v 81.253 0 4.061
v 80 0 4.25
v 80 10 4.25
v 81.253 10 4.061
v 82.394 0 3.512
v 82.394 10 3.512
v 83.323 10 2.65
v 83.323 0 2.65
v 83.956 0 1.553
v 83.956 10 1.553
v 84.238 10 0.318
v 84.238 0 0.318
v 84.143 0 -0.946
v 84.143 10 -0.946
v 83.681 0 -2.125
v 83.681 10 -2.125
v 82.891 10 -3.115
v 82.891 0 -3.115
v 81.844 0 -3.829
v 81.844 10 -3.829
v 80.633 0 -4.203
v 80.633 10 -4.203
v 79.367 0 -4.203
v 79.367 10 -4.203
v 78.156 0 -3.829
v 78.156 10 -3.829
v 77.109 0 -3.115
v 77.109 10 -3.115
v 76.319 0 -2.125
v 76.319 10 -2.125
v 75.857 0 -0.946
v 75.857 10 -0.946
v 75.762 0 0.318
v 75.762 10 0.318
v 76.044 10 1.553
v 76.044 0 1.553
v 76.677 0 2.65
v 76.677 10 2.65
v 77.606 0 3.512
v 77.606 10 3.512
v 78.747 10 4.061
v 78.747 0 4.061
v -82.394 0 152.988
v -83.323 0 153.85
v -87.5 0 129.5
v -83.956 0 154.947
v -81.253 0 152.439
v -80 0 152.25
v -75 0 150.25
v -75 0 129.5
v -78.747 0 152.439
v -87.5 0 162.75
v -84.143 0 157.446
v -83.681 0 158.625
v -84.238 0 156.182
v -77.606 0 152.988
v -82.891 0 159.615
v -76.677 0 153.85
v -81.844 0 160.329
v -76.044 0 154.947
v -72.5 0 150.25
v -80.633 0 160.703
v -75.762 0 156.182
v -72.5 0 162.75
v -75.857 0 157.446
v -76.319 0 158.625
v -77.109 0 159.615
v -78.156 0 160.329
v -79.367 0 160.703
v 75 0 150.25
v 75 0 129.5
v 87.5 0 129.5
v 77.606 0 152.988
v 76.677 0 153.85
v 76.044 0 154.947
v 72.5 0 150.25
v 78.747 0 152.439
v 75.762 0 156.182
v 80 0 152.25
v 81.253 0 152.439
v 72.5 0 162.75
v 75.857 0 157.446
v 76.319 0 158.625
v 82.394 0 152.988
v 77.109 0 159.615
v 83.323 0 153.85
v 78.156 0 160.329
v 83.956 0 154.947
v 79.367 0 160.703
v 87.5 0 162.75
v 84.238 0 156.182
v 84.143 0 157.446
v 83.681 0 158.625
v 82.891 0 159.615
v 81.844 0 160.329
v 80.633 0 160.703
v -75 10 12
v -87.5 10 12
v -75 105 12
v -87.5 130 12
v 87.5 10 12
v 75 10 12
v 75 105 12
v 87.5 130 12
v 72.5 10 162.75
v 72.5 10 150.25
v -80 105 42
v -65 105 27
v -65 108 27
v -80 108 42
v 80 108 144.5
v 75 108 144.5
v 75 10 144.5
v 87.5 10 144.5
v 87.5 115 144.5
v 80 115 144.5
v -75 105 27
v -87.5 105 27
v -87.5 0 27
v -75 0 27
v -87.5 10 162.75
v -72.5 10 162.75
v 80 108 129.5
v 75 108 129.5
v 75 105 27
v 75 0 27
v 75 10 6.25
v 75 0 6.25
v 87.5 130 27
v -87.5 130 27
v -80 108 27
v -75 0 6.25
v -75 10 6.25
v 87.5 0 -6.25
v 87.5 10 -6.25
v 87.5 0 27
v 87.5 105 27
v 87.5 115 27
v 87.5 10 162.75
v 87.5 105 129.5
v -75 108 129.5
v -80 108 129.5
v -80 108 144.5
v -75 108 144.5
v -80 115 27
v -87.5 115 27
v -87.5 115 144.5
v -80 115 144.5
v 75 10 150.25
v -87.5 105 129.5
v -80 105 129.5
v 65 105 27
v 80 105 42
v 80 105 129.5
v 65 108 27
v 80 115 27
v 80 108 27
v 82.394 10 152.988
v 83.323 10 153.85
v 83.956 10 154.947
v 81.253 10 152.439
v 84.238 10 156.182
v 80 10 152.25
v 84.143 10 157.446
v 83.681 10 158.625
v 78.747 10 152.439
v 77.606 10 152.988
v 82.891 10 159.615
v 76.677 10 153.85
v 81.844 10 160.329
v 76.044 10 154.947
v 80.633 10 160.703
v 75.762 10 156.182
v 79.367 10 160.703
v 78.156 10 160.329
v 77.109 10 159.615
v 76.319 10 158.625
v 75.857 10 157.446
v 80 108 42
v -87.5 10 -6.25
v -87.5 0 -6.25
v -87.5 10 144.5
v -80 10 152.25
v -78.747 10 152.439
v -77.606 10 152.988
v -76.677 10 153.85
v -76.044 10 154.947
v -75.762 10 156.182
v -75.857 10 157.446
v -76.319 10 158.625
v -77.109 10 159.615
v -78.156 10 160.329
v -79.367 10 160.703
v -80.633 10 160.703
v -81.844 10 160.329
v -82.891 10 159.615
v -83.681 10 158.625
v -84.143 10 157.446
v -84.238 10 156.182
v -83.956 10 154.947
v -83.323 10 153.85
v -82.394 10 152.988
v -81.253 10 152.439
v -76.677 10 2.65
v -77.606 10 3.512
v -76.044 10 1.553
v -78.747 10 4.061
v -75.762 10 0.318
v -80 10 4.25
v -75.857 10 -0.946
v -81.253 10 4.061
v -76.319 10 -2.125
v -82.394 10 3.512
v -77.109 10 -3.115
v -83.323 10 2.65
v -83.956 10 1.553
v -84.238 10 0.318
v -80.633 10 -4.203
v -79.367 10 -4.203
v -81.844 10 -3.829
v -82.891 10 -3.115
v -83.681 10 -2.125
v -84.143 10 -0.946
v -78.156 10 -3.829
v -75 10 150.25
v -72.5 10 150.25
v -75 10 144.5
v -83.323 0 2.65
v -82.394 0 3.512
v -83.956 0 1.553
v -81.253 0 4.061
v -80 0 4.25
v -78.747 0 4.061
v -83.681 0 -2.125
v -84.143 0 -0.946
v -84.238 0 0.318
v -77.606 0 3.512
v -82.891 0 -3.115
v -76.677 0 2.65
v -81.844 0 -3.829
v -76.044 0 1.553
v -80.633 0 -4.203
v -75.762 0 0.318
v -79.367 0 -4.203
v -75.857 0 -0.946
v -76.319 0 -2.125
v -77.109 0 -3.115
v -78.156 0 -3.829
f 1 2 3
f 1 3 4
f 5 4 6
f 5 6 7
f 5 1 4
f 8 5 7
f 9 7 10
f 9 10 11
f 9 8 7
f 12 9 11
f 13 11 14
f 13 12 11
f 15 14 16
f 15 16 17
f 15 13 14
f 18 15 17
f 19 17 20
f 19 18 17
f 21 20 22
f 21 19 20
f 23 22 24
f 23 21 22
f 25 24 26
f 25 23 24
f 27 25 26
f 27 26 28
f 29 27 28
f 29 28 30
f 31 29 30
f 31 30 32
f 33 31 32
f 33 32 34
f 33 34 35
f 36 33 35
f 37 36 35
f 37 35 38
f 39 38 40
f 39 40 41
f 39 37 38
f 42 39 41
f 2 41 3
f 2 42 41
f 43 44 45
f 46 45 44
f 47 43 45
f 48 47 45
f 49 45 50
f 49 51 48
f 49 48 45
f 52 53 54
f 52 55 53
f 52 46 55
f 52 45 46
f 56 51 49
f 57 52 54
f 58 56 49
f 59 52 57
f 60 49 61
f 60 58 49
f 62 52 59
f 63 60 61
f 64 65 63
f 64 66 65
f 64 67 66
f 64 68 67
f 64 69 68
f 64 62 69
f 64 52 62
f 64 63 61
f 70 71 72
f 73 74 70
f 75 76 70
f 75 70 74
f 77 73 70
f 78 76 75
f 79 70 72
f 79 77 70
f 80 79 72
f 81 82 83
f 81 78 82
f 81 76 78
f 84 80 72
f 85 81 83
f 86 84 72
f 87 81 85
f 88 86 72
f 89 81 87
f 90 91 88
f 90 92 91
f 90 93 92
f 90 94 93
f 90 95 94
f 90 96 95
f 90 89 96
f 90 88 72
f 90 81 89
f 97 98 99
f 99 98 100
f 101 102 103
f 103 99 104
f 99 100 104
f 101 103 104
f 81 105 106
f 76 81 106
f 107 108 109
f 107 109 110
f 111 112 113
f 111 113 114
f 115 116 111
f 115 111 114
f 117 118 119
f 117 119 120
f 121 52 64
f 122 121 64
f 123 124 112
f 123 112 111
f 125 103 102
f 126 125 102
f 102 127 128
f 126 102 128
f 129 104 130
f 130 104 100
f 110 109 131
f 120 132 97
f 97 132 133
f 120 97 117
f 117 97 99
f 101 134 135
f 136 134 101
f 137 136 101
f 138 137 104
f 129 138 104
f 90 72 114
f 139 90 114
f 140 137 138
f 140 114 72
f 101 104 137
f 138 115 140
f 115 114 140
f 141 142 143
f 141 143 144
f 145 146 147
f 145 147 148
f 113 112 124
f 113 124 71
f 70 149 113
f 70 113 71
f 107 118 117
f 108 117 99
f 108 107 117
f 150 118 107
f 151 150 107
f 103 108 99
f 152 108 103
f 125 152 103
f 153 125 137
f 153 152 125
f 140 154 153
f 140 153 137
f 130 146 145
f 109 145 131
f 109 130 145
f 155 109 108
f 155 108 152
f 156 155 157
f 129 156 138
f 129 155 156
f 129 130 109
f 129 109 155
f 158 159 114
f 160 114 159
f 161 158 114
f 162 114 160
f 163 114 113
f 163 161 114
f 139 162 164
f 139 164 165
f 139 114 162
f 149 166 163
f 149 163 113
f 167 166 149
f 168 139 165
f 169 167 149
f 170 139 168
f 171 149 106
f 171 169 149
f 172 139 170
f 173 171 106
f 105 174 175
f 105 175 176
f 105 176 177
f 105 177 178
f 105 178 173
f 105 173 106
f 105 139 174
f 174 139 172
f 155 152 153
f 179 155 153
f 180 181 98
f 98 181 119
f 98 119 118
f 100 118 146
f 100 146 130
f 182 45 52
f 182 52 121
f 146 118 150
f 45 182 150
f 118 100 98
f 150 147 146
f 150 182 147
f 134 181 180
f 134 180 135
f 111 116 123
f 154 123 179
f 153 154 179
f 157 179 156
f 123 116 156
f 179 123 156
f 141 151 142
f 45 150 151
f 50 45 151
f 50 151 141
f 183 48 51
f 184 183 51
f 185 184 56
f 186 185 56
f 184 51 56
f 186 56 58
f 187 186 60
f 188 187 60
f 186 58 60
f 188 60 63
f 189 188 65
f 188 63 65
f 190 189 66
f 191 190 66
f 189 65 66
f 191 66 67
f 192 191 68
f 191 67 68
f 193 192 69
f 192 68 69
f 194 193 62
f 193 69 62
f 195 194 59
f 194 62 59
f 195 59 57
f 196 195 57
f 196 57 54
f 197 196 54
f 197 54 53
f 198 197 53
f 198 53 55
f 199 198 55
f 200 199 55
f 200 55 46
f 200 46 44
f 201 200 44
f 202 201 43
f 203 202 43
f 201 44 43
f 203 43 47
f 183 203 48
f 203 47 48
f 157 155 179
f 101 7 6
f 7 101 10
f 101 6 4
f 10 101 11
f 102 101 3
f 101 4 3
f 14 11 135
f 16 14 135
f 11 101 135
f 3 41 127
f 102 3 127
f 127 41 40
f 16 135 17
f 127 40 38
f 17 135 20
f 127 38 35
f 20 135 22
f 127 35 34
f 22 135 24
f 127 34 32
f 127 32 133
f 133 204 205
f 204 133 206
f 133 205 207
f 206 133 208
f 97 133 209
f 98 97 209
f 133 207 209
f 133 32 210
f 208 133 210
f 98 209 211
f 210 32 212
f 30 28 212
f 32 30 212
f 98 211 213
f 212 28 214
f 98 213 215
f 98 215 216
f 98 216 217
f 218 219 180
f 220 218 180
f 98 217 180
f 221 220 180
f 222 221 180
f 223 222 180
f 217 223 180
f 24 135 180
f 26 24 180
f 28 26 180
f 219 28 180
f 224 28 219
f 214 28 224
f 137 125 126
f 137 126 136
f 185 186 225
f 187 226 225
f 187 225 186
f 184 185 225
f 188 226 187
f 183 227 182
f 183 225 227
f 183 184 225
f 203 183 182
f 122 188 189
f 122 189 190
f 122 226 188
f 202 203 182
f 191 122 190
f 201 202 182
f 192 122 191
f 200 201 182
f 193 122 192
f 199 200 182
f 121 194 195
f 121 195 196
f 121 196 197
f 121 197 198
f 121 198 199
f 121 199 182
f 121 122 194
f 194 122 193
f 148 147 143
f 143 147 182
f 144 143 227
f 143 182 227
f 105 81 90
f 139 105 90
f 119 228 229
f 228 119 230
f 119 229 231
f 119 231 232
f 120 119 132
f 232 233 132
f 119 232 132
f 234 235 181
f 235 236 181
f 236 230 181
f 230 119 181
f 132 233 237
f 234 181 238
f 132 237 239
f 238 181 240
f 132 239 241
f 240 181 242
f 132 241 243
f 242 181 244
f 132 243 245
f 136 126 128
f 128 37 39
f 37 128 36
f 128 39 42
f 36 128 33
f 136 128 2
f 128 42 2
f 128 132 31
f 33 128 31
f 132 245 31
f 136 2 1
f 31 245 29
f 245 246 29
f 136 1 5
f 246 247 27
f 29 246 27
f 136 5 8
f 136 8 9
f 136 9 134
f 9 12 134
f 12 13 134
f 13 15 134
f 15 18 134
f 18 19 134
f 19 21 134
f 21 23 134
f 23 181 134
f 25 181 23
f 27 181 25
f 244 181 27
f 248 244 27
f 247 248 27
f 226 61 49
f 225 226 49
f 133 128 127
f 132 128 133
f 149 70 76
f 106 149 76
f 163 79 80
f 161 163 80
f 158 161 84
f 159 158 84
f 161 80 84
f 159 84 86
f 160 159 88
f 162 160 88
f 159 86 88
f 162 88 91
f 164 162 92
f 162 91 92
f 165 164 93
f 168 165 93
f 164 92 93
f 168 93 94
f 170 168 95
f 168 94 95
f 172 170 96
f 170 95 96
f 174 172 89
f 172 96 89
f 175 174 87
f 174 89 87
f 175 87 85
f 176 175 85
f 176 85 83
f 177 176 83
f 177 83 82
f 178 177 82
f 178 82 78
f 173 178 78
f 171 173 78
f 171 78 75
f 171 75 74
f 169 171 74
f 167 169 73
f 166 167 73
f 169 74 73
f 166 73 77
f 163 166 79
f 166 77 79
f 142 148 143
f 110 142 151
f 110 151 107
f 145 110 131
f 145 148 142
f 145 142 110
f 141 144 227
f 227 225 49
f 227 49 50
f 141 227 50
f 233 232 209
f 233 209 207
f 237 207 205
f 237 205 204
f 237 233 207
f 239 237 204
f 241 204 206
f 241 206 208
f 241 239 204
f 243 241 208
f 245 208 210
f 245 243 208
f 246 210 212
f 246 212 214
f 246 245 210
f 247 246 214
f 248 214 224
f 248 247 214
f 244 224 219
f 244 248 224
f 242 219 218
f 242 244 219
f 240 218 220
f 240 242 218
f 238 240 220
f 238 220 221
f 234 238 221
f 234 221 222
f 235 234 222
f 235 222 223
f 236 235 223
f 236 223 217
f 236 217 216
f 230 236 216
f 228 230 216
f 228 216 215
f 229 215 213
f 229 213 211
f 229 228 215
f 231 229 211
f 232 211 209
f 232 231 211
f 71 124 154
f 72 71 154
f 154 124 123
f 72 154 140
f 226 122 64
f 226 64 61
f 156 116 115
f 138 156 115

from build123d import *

# Parameters (mm, degrees)
SKETCH1_R                      = 4.25
BOSS_EXTRUDE1_DEPTH            = 10
BOSS_EXTRUDE2_START            = -5
BOSS_EXTRUDE2_DEPTH            = 15
SKETCH3_W                      = 175
SKETCH3_H                      = 10
BOSS_EXTRUDE3_DEPTH            = 51.25
SKETCH4_W                      = 160
SKETCH4_H                      = 117.5
CUT_EXTRUDE1_DEPTH             = 10
CUT_EXTRUDE1_DIRECTION_2_REACH = 219.644
SKETCH5_W                      = 175
SKETCH5_H                      = 117.5
CUT_EXTRUDE2_DEPTH             = 15
SKETCH6_W                      = 5
SKETCH6_H                      = 15
BOSS_EXTRUDE4_DEPTH            = 3
CUT_EXTRUDE3_REACH             = 222.327
SKETCH7_W                      = 145
SKETCH7_H                      = 12.5


with BuildPart() as part:
    # Sketch1 → Boss-Extrude1 (new body)
    with BuildSketch(Plane(origin=(0, 0, 0), x_dir=(1, 0, 0), z_dir=(0, 1, 0))):
        Polygon((-87.5, 6.25), (87.5, 6.25), (87.5, -17), (75, -17), (75, -6.25), (-75, -6.25), (-75, -17), (-87.5, -17), align=None)
        with Locations(Location((-80, 0, 0), (0, 0, 270))):
            Circle(SKETCH1_R, mode=Mode.SUBTRACT)
        with Locations(Location((80, 0, 0), (0, 0, 270))):
            Circle(SKETCH1_R, mode=Mode.SUBTRACT)
    boss_extrude1 = extrude(amount=BOSS_EXTRUDE1_DEPTH)

    # Sketch2 → Boss-Extrude2 (add)
    with BuildSketch(Plane.XY.offset(17).offset(BOSS_EXTRUDE2_START)):
        Polygon((87.5, 130), (-87.5, 130), (-87.5, 0), (-75, 0), (-75, 105), (75, 105), (75, 0), (87.5, 0), align=None)
    boss_extrude2 = extrude(amount=BOSS_EXTRUDE2_DEPTH)

    # Sketch3 → Boss-Extrude3 (add)
    with BuildSketch(Plane.XY.offset(27)):
        with Locations((0, 110)):
            Rectangle(SKETCH3_W, SKETCH3_H)
    boss_extrude3 = extrude(amount=BOSS_EXTRUDE3_DEPTH)

    # Mirror2: Boss-Extrude1, Boss-Extrude2, Boss-Extrude3 across plane
    add(boss_extrude1.mirror(Plane.XY.offset(78.25)))
    add(boss_extrude2.mirror(Plane.XY.offset(78.25)))
    add(boss_extrude3.mirror(Plane.XY.offset(78.25)))

    # Sketch4 → Cut-Extrude1 (cut)
    with BuildSketch(Plane(origin=(0, 115, 0), x_dir=(1, 0, 0), z_dir=(0, 1, 0))):
        with Locations((0, -85.75)):
            Rectangle(SKETCH4_W, SKETCH4_H)
    extrude(amount=-CUT_EXTRUDE1_DEPTH, mode=Mode.SUBTRACT)

    # Cut-Extrude1 direction 2: up to this face of the body (flat: up to its plane)
    cut_extrude1_direction_2_end = Plane(part.part.faces().sort_by_distance((0, 130, 137))[0])
    # Sketch4 → Cut-Extrude1 direction 2 (cut, up to the picked face)
    with BuildSketch(Plane(origin=(0, 115, 0), x_dir=(1, 0, 0), z_dir=(0, 1, 0)), mode=Mode.PRIVATE) as cut_extrude1_direction_2_sk1:
        with Locations((0, -85.75)):
            Rectangle(SKETCH4_W, SKETCH4_H)
    cut_extrude1_direction_2_tool1 = split(extrude(cut_extrude1_direction_2_sk1.sketch, amount=CUT_EXTRUDE1_DIRECTION_2_REACH, mode=Mode.PRIVATE), bisect_by=cut_extrude1_direction_2_end, keep=Keep.BOTH, mode=Mode.PRIVATE)
    add(cut_extrude1_direction_2_tool1.solids().sort_by(Axis((0, 115, 85.75), (0, 1, 0)))[0], mode=Mode.SUBTRACT)

    # Sketch5 → Cut-Extrude2 (cut)
    with BuildSketch(Plane(origin=(0, 115, 0), x_dir=(1, 0, 0), z_dir=(0, 1, 0))):
        with Locations((0, -85.75)):
            Rectangle(SKETCH5_W, SKETCH5_H)
    extrude(amount=CUT_EXTRUDE2_DEPTH, mode=Mode.SUBTRACT)

    # Sketch6 → Boss-Extrude4 (add)
    with BuildSketch(Plane(origin=(0, 105, 0), x_dir=(1, 0, 0), z_dir=(0, 1, 0))):
        with Locations((-77.5, -137)):
            Rectangle(SKETCH6_W, SKETCH6_H)
        with Locations((77.5, -137)):
            Rectangle(SKETCH6_W, SKETCH6_H)
        Polygon((-80, -27), (-65, -27), (-80, -42), align=None)
        Polygon((80, -27), (65, -27), (80, -42), align=None)
    extrude(amount=BOSS_EXTRUDE4_DEPTH)

    # Sketch7 → Cut-Extrude3 (cut, up to next)
    with BuildSketch(Plane(origin=(0, 10, 0), x_dir=(1, 0, 0), z_dir=(0, 1, 0)), mode=Mode.PRIVATE) as cut_extrude3_sk1:
        with Locations((0, -156.5)):
            Rectangle(SKETCH7_W, SKETCH7_H)
    cut_extrude3_tool1 = extrude(cut_extrude3_sk1.sketch, amount=-CUT_EXTRUDE3_REACH, mode=Mode.PRIVATE) & part.part
    add(cut_extrude3_tool1.solids().sort_by_distance((0, 10, 156.5))[0], mode=Mode.SUBTRACT)


solid = part.part
